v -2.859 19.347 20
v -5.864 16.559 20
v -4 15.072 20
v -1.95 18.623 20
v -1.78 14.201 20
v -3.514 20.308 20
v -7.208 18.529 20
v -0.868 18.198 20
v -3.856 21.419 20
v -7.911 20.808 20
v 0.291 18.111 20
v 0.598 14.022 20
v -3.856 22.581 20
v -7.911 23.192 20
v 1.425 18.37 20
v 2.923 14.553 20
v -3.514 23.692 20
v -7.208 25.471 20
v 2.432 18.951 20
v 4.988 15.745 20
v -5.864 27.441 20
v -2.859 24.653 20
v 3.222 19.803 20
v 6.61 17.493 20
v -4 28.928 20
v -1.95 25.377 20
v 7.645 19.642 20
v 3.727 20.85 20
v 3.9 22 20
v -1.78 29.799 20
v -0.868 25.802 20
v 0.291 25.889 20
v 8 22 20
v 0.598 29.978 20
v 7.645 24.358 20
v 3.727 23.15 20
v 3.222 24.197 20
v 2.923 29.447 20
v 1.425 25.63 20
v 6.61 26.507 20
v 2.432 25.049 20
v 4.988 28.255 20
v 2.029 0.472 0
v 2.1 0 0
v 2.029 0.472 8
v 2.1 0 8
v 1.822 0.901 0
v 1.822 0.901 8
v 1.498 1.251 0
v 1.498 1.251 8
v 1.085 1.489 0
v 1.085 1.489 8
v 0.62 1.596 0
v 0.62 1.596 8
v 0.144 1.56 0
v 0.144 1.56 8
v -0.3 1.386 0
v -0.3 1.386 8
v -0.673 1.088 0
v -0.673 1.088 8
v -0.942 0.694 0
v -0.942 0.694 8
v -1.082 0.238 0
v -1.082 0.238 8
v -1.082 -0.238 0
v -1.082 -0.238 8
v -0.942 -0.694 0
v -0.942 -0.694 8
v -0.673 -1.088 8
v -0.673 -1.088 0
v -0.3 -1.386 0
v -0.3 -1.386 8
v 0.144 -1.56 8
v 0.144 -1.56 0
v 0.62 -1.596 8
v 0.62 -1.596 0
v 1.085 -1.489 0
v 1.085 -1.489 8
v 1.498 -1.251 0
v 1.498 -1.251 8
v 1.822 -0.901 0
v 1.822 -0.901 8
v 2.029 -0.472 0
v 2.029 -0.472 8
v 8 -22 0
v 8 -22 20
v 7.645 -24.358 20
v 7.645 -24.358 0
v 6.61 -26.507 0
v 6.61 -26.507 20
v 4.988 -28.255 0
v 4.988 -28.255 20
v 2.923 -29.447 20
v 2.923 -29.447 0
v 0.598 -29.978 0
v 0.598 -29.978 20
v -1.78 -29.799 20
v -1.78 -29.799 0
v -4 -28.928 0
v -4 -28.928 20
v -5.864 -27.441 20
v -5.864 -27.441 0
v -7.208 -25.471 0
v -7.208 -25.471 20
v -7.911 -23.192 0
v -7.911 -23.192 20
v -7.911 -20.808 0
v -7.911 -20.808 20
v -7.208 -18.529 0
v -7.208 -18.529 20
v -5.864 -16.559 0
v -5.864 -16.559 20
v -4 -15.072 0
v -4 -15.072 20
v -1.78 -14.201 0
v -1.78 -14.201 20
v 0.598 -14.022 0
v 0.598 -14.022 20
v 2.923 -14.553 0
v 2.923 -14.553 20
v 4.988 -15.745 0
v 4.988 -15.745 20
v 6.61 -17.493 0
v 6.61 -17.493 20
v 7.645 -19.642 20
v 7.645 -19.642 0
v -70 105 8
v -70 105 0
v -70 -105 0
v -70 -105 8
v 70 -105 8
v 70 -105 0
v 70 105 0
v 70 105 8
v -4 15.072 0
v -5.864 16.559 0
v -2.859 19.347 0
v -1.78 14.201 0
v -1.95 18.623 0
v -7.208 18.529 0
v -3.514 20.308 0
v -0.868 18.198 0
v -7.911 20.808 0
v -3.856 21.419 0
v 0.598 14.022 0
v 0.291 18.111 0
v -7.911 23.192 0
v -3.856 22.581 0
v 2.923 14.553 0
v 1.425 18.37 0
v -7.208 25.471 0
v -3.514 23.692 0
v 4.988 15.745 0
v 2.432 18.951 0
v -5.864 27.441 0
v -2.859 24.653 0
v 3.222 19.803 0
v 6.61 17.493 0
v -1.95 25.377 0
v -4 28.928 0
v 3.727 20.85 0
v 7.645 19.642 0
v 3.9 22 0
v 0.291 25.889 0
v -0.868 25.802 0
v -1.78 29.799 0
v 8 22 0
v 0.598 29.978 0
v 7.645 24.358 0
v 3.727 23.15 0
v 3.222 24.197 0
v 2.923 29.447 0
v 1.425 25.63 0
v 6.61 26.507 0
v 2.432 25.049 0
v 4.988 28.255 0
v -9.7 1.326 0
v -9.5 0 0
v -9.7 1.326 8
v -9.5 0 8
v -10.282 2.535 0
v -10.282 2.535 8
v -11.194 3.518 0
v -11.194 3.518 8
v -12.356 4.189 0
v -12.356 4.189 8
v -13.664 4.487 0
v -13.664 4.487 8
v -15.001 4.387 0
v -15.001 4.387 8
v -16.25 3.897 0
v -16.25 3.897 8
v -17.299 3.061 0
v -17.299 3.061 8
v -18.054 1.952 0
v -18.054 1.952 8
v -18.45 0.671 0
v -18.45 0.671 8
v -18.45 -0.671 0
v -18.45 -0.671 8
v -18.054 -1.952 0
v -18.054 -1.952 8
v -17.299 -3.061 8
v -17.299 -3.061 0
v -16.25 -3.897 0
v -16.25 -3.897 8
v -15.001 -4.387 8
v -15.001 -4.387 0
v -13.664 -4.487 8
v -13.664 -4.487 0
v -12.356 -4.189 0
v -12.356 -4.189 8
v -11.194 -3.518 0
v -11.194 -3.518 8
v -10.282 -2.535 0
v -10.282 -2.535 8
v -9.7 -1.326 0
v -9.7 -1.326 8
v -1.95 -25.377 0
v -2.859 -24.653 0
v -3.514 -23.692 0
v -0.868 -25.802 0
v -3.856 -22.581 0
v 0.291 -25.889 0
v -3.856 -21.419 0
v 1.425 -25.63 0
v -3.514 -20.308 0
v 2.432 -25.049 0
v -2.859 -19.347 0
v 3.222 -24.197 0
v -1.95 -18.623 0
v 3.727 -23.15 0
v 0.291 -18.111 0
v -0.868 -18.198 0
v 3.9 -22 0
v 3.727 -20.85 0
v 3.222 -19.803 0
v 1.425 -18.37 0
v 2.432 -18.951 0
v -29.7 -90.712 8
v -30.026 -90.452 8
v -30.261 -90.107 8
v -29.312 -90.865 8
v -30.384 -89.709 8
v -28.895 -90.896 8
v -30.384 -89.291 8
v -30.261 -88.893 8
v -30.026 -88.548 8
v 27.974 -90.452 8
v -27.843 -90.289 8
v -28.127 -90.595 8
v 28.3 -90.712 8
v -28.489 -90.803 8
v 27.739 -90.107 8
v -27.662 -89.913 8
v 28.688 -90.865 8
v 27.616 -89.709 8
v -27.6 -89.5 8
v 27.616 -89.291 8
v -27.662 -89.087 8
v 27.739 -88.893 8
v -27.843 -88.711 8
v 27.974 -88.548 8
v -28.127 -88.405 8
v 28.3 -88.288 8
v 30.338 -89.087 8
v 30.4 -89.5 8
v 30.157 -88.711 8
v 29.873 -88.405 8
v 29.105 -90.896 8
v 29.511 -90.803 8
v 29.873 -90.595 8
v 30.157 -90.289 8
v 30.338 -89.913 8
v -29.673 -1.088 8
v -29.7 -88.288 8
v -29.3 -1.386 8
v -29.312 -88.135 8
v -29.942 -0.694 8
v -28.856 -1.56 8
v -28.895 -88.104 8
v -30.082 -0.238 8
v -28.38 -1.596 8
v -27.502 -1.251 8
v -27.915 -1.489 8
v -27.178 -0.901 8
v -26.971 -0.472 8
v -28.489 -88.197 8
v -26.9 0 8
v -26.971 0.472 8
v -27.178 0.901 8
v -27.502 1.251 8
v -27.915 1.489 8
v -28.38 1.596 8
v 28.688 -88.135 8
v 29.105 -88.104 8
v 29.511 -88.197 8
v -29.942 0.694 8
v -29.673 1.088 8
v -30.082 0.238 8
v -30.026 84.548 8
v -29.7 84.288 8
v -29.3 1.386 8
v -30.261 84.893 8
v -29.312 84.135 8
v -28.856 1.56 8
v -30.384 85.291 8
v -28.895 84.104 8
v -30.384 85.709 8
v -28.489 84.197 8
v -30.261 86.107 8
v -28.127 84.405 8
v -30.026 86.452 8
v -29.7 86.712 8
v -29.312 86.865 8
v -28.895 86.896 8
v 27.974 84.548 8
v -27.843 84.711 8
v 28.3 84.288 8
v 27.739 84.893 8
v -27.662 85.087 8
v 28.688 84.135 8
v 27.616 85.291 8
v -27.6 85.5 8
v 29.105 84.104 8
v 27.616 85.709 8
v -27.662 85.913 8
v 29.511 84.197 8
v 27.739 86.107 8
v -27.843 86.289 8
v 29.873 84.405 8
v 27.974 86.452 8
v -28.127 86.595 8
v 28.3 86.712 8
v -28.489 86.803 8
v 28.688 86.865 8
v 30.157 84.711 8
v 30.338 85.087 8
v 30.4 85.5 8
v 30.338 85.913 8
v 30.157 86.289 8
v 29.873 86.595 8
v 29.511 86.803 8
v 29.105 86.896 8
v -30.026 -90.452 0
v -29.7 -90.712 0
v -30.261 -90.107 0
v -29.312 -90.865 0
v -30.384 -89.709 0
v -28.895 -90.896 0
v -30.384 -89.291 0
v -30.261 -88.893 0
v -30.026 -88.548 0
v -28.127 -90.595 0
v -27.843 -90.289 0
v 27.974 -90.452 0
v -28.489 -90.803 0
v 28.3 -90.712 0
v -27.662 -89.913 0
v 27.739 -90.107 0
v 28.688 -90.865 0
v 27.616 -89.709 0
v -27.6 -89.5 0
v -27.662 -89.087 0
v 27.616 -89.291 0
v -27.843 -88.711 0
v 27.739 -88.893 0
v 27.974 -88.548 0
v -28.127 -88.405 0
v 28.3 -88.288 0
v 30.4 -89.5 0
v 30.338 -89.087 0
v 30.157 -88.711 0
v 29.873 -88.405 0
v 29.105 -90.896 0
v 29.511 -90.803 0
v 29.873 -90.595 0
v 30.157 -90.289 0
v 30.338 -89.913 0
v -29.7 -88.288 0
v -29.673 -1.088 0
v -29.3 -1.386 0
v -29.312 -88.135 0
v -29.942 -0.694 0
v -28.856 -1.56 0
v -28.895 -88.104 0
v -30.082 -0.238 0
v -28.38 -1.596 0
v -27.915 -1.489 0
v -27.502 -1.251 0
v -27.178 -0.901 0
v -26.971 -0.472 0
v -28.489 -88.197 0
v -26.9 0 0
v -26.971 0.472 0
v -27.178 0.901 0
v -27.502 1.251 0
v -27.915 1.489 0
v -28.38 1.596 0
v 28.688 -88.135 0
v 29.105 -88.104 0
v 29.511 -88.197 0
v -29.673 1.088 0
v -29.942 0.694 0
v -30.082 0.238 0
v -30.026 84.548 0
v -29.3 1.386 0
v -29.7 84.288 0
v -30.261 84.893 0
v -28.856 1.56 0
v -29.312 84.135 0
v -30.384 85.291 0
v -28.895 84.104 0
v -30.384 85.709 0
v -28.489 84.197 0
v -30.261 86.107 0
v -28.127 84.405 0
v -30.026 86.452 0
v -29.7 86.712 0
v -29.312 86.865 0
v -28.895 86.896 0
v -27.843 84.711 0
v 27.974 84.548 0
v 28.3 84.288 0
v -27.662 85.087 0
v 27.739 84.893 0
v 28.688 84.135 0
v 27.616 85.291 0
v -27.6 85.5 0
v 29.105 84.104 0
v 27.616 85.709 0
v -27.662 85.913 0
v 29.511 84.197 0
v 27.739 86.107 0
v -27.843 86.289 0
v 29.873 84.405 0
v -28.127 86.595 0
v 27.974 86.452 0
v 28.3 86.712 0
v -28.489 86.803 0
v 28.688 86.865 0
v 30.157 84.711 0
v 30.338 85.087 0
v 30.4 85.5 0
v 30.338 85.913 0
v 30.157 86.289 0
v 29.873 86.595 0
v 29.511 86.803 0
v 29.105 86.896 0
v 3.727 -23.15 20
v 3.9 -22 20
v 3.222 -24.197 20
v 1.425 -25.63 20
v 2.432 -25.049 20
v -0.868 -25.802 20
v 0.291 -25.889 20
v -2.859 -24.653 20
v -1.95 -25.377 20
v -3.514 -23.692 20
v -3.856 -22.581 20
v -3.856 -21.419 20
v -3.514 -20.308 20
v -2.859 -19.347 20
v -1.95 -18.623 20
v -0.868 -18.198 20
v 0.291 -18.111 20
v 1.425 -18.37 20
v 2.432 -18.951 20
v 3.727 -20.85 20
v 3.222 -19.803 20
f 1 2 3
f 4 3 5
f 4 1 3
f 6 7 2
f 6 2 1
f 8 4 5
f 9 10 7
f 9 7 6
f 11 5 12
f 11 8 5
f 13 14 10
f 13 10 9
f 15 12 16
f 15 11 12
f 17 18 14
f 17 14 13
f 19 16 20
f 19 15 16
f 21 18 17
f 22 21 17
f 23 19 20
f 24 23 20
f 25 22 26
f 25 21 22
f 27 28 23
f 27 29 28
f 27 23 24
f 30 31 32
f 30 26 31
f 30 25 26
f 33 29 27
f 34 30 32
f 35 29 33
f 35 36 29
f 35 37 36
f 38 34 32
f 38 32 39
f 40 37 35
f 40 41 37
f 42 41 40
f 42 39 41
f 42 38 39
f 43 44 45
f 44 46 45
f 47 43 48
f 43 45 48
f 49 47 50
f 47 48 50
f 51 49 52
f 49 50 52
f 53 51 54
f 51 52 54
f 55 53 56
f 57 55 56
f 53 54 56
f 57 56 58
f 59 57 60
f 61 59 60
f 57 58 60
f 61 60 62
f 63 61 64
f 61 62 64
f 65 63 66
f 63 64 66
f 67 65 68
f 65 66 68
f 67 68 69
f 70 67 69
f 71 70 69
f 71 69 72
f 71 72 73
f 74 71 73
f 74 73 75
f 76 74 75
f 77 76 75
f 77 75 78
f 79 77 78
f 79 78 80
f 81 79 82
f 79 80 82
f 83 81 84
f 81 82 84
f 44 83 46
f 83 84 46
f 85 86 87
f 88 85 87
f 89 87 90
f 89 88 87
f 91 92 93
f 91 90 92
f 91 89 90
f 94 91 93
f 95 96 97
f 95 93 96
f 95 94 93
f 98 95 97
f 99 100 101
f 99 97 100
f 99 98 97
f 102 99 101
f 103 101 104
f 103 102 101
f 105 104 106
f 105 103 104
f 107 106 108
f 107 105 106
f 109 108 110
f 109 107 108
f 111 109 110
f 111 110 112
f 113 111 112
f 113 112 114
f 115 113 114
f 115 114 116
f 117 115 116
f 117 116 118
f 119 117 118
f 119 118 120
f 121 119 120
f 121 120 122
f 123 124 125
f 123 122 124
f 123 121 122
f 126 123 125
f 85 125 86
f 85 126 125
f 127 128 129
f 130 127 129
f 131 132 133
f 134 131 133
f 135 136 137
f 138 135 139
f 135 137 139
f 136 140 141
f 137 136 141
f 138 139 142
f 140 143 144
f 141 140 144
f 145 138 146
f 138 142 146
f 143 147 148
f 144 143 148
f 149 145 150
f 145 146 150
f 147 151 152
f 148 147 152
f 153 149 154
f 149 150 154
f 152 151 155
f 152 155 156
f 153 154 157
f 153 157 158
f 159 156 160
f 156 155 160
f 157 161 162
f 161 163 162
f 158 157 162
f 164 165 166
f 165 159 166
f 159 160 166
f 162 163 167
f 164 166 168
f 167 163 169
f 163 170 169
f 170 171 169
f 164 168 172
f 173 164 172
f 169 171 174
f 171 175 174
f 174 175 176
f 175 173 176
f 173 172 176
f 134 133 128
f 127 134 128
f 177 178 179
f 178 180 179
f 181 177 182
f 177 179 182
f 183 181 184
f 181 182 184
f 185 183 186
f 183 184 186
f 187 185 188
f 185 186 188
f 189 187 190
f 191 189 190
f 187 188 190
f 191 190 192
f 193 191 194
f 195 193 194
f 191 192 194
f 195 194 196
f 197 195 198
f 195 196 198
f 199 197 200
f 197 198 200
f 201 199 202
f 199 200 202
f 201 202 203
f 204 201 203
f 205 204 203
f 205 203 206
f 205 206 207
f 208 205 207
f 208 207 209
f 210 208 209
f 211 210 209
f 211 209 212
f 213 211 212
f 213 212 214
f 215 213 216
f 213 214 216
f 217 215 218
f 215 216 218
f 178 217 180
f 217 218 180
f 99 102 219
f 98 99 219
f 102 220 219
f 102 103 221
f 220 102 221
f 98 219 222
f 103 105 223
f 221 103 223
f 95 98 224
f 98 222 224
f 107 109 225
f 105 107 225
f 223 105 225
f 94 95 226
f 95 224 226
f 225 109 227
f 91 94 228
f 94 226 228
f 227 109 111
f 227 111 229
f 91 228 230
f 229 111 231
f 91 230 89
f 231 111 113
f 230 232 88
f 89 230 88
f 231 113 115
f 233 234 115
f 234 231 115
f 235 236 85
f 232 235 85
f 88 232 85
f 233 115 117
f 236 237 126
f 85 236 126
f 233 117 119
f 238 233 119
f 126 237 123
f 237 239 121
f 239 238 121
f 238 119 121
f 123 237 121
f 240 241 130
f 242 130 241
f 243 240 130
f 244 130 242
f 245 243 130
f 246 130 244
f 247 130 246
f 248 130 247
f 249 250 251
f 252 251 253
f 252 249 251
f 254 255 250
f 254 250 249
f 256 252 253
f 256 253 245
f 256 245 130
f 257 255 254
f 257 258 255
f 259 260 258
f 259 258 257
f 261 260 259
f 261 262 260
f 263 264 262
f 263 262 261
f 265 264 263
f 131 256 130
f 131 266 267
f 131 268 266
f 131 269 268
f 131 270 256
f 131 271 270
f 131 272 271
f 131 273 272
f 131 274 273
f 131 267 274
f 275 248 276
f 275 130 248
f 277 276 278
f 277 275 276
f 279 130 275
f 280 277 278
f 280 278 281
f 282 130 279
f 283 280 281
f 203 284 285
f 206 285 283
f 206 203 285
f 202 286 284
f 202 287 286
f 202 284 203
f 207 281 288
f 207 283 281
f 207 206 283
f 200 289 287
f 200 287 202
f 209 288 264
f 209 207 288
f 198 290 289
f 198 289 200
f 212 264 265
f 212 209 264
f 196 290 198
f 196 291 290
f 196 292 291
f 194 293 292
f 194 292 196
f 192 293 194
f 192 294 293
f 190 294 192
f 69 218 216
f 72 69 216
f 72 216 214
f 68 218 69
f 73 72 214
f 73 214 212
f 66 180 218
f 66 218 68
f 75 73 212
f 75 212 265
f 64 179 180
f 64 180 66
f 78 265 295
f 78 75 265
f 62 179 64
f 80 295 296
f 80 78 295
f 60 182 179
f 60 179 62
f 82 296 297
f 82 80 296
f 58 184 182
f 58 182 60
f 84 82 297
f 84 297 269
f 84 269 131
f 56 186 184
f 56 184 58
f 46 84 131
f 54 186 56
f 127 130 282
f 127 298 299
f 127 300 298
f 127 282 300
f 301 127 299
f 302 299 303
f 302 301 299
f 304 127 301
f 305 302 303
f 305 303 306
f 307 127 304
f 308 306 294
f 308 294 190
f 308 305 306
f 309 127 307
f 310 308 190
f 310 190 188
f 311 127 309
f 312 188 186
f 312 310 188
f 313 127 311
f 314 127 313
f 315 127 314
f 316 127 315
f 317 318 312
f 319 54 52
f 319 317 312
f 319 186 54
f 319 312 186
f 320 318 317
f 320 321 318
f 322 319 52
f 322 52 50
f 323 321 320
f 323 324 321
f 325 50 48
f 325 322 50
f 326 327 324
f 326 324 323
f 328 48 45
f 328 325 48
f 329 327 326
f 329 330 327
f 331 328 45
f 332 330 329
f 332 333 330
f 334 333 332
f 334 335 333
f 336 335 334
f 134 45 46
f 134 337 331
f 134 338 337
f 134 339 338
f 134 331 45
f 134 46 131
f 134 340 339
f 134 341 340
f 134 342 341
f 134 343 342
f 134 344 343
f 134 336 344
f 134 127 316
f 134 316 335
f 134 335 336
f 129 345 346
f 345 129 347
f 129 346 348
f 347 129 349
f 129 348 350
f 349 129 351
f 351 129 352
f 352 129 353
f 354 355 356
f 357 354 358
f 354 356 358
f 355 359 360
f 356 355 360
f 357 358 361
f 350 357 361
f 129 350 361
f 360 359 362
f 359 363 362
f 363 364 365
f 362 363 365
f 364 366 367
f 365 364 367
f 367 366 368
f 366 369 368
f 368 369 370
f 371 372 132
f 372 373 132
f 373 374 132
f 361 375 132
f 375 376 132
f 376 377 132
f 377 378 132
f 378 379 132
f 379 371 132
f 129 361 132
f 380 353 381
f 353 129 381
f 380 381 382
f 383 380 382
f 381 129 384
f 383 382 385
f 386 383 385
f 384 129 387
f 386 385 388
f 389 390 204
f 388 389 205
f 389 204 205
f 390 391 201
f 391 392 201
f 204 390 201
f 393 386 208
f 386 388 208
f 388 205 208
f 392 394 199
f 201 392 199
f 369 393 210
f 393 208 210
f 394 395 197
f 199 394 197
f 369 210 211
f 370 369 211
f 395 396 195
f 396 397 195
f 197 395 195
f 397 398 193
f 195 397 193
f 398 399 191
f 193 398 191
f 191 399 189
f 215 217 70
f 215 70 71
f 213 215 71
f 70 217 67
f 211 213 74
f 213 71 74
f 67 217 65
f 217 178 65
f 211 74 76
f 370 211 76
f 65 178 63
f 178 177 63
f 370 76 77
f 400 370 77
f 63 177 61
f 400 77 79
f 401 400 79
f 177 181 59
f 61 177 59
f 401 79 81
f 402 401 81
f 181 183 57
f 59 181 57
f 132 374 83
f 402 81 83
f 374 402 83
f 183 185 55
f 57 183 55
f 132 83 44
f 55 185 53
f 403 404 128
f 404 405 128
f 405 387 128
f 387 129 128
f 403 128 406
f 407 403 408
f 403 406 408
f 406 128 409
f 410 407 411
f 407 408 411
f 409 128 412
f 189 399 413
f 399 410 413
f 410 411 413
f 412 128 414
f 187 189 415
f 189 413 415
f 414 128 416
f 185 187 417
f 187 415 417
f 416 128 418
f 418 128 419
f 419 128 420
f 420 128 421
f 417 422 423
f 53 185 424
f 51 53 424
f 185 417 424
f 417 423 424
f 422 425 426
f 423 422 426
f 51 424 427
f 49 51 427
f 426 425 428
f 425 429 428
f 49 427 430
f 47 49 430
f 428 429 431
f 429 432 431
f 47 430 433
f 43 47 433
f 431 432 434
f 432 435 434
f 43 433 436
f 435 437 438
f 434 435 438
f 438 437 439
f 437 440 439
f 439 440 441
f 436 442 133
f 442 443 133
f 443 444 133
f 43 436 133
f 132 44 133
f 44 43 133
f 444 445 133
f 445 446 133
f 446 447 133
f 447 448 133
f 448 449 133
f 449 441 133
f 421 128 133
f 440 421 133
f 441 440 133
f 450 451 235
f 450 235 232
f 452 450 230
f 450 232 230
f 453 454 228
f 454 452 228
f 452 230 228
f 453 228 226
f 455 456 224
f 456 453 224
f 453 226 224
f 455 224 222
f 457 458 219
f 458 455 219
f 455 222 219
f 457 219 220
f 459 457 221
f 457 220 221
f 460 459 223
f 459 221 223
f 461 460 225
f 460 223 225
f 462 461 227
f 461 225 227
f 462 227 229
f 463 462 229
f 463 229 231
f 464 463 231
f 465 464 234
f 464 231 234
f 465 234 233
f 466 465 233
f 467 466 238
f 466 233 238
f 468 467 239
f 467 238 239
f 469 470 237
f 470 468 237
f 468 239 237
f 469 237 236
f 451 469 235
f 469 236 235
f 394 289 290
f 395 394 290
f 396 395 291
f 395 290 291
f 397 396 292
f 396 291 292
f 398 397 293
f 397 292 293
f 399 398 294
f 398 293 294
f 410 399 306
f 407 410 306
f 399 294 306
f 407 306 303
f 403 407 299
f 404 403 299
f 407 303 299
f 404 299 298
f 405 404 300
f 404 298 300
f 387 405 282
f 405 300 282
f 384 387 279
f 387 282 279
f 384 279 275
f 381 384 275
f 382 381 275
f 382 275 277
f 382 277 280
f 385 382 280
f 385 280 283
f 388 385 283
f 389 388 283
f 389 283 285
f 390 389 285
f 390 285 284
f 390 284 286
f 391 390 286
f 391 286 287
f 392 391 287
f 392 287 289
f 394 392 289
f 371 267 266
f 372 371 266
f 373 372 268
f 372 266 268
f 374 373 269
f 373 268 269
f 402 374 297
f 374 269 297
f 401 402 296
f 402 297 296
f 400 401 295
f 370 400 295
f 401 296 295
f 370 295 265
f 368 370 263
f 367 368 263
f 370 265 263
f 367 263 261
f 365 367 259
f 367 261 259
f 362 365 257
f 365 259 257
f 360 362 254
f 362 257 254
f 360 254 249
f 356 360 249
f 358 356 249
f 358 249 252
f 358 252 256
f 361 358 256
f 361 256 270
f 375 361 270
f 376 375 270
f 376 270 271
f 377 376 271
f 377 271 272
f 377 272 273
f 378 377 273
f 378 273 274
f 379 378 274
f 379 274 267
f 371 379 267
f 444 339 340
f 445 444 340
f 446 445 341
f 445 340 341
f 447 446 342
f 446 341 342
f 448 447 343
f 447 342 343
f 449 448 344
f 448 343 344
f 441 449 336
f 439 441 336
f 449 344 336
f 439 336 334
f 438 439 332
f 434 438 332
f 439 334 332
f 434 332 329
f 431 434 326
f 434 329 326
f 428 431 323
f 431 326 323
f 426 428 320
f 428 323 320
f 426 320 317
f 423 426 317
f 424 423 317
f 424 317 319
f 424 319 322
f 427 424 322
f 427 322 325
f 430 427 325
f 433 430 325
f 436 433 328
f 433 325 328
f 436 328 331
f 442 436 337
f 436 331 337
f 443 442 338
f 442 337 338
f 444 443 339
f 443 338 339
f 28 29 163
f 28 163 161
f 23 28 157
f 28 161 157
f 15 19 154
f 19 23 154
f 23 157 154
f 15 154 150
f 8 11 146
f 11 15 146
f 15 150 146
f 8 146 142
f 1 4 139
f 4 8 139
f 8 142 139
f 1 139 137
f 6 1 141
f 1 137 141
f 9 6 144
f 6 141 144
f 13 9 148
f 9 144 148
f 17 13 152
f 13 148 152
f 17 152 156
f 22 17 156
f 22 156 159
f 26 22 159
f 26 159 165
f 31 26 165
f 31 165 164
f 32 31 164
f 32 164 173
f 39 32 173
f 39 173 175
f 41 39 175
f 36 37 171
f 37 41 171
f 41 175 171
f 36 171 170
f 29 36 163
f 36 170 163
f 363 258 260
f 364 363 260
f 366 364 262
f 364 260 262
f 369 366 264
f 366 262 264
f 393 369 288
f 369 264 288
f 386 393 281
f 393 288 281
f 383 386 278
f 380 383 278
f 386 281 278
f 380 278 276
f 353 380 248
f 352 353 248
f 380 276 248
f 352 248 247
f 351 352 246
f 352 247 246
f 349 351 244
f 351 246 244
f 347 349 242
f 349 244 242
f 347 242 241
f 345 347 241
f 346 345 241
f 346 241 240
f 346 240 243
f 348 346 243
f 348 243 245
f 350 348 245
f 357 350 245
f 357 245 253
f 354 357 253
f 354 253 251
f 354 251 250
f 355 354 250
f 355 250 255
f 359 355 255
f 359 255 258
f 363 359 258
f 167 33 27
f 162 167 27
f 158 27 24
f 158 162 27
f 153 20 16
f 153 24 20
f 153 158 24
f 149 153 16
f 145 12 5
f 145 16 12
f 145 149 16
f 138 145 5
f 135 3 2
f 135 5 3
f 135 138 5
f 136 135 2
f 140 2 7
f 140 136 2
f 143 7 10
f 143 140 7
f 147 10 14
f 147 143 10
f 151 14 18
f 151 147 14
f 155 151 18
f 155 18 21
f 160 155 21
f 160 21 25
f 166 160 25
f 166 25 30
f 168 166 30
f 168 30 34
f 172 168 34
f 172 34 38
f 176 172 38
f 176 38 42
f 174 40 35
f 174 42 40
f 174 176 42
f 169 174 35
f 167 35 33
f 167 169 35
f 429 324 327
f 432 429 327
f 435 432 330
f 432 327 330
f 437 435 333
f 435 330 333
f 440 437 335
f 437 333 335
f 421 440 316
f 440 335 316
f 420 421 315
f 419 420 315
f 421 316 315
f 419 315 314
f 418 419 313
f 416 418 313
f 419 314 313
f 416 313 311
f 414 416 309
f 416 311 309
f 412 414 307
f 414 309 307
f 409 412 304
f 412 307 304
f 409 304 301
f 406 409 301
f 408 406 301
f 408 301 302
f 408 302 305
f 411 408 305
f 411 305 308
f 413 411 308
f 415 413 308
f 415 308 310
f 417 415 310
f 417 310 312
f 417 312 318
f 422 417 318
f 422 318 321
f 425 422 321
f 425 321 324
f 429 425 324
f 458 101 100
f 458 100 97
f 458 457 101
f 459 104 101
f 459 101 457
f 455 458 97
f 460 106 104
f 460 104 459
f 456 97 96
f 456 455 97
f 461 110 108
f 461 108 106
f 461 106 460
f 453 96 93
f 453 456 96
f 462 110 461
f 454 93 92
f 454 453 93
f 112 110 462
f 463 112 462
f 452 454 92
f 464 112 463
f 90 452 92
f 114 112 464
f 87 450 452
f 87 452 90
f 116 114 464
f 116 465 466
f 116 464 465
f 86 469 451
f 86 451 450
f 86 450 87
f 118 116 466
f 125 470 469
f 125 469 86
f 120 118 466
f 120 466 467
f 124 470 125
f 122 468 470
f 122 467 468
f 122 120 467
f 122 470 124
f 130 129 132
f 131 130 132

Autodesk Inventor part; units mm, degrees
ref_plane "YZ Plane" through (0, 0, 0) normal (1, 0, 0) x (0, 1, 0)
ref_plane "XZ Plane" through (0, 0, 0) normal (0, 1, 0) x (-1, 0, 0)
sketch "Skizze1" plane through (0, 0, 0) normal (0, 0, 1) x (1, 0, 0)
  line L0 (-70, -105) -> (70, -105)
  line L1 (70, -105) -> (70, 105)
  line L2 (70, 105) -> (-70, 105)
  line L3 (-70, 105) -> (-70, -105)
extrude "Extrusion1" add sketch "Skizze1" along normal blind 8
ref_plane "Arbeitsebene1" through (0, 0, 8) normal (0, 0, 1) x (1, 0, 0)
sketch "Skizze2" plane through (0, 0, 8) normal (0, 0, 1) x (1, 0, 0)
  circle A0 centre (-14, 0) radius 4.5
extrude "Extrusion2" cut sketch "Skizze2" against normal blind 8.2
sketch "Skizze3" plane through (0, 0, 8) normal (0, 0, 1) x (1, 0, 0)
  circle A0 centre (-28.5, 0) radius 1.6
extrude "Extrusion3" cut sketch "Skizze3" against normal blind 8.2
sketch "Skizze4" plane through (0, 0, 8) normal (0, 0, 1) x (1, 0, 0)
  circle A0 centre (0.5, 0) radius 1.6
extrude "Extrusion4" cut sketch "Skizze4" against normal blind 8.2
sketch "Skizze5" plane through (0, 0, 8) normal (0, 0, 1) x (1, 0, 0)
  circle A0 centre (-29, -89.5) radius 1.4
extrude "Extrusion5" cut sketch "Skizze5" against normal blind 8.2
sketch "Skizze6" plane through (0, 0, 8) normal (0, 0, 1) x (1, 0, 0)
  circle A0 centre (29, -89.5) radius 1.4
extrude "Extrusion6" cut sketch "Skizze6" against normal blind 8.2
sketch "Skizze7" plane through (0, 0, 8) normal (0, 0, 1) x (1, 0, 0)
  circle A0 centre (-29, 85.5) radius 1.4
extrude "Extrusion7" cut sketch "Skizze7" against normal blind 8.2
sketch "Skizze8" plane through (0, 0, 8) normal (0, 0, 1) x (1, 0, 0)
  circle A0 centre (29, 85.5) radius 1.4
extrude "Extrusion8" cut sketch "Skizze8" against normal blind 8.2
sketch "Skizze9" plane through (0, 0, 0) normal (0, 0, 1) x (1, 0, 0)
  circle A0 centre (0, -22) radius 8
  circle A1 centre (0, -22) radius 3.9
extrude "Extrusion9" add sketch "Skizze9" along normal blind 20 separate body
sketch "Skizze10" plane through (0, 0, 0) normal (0, 0, 1) x (1, 0, 0)
  circle A0 centre (0, 22) radius 8
  circle A1 centre (0, 22) radius 3.9
extrude "Extrusion10" add sketch "Skizze10" along normal blind 20 separate body
properties part number "Grundplatte_v4"
